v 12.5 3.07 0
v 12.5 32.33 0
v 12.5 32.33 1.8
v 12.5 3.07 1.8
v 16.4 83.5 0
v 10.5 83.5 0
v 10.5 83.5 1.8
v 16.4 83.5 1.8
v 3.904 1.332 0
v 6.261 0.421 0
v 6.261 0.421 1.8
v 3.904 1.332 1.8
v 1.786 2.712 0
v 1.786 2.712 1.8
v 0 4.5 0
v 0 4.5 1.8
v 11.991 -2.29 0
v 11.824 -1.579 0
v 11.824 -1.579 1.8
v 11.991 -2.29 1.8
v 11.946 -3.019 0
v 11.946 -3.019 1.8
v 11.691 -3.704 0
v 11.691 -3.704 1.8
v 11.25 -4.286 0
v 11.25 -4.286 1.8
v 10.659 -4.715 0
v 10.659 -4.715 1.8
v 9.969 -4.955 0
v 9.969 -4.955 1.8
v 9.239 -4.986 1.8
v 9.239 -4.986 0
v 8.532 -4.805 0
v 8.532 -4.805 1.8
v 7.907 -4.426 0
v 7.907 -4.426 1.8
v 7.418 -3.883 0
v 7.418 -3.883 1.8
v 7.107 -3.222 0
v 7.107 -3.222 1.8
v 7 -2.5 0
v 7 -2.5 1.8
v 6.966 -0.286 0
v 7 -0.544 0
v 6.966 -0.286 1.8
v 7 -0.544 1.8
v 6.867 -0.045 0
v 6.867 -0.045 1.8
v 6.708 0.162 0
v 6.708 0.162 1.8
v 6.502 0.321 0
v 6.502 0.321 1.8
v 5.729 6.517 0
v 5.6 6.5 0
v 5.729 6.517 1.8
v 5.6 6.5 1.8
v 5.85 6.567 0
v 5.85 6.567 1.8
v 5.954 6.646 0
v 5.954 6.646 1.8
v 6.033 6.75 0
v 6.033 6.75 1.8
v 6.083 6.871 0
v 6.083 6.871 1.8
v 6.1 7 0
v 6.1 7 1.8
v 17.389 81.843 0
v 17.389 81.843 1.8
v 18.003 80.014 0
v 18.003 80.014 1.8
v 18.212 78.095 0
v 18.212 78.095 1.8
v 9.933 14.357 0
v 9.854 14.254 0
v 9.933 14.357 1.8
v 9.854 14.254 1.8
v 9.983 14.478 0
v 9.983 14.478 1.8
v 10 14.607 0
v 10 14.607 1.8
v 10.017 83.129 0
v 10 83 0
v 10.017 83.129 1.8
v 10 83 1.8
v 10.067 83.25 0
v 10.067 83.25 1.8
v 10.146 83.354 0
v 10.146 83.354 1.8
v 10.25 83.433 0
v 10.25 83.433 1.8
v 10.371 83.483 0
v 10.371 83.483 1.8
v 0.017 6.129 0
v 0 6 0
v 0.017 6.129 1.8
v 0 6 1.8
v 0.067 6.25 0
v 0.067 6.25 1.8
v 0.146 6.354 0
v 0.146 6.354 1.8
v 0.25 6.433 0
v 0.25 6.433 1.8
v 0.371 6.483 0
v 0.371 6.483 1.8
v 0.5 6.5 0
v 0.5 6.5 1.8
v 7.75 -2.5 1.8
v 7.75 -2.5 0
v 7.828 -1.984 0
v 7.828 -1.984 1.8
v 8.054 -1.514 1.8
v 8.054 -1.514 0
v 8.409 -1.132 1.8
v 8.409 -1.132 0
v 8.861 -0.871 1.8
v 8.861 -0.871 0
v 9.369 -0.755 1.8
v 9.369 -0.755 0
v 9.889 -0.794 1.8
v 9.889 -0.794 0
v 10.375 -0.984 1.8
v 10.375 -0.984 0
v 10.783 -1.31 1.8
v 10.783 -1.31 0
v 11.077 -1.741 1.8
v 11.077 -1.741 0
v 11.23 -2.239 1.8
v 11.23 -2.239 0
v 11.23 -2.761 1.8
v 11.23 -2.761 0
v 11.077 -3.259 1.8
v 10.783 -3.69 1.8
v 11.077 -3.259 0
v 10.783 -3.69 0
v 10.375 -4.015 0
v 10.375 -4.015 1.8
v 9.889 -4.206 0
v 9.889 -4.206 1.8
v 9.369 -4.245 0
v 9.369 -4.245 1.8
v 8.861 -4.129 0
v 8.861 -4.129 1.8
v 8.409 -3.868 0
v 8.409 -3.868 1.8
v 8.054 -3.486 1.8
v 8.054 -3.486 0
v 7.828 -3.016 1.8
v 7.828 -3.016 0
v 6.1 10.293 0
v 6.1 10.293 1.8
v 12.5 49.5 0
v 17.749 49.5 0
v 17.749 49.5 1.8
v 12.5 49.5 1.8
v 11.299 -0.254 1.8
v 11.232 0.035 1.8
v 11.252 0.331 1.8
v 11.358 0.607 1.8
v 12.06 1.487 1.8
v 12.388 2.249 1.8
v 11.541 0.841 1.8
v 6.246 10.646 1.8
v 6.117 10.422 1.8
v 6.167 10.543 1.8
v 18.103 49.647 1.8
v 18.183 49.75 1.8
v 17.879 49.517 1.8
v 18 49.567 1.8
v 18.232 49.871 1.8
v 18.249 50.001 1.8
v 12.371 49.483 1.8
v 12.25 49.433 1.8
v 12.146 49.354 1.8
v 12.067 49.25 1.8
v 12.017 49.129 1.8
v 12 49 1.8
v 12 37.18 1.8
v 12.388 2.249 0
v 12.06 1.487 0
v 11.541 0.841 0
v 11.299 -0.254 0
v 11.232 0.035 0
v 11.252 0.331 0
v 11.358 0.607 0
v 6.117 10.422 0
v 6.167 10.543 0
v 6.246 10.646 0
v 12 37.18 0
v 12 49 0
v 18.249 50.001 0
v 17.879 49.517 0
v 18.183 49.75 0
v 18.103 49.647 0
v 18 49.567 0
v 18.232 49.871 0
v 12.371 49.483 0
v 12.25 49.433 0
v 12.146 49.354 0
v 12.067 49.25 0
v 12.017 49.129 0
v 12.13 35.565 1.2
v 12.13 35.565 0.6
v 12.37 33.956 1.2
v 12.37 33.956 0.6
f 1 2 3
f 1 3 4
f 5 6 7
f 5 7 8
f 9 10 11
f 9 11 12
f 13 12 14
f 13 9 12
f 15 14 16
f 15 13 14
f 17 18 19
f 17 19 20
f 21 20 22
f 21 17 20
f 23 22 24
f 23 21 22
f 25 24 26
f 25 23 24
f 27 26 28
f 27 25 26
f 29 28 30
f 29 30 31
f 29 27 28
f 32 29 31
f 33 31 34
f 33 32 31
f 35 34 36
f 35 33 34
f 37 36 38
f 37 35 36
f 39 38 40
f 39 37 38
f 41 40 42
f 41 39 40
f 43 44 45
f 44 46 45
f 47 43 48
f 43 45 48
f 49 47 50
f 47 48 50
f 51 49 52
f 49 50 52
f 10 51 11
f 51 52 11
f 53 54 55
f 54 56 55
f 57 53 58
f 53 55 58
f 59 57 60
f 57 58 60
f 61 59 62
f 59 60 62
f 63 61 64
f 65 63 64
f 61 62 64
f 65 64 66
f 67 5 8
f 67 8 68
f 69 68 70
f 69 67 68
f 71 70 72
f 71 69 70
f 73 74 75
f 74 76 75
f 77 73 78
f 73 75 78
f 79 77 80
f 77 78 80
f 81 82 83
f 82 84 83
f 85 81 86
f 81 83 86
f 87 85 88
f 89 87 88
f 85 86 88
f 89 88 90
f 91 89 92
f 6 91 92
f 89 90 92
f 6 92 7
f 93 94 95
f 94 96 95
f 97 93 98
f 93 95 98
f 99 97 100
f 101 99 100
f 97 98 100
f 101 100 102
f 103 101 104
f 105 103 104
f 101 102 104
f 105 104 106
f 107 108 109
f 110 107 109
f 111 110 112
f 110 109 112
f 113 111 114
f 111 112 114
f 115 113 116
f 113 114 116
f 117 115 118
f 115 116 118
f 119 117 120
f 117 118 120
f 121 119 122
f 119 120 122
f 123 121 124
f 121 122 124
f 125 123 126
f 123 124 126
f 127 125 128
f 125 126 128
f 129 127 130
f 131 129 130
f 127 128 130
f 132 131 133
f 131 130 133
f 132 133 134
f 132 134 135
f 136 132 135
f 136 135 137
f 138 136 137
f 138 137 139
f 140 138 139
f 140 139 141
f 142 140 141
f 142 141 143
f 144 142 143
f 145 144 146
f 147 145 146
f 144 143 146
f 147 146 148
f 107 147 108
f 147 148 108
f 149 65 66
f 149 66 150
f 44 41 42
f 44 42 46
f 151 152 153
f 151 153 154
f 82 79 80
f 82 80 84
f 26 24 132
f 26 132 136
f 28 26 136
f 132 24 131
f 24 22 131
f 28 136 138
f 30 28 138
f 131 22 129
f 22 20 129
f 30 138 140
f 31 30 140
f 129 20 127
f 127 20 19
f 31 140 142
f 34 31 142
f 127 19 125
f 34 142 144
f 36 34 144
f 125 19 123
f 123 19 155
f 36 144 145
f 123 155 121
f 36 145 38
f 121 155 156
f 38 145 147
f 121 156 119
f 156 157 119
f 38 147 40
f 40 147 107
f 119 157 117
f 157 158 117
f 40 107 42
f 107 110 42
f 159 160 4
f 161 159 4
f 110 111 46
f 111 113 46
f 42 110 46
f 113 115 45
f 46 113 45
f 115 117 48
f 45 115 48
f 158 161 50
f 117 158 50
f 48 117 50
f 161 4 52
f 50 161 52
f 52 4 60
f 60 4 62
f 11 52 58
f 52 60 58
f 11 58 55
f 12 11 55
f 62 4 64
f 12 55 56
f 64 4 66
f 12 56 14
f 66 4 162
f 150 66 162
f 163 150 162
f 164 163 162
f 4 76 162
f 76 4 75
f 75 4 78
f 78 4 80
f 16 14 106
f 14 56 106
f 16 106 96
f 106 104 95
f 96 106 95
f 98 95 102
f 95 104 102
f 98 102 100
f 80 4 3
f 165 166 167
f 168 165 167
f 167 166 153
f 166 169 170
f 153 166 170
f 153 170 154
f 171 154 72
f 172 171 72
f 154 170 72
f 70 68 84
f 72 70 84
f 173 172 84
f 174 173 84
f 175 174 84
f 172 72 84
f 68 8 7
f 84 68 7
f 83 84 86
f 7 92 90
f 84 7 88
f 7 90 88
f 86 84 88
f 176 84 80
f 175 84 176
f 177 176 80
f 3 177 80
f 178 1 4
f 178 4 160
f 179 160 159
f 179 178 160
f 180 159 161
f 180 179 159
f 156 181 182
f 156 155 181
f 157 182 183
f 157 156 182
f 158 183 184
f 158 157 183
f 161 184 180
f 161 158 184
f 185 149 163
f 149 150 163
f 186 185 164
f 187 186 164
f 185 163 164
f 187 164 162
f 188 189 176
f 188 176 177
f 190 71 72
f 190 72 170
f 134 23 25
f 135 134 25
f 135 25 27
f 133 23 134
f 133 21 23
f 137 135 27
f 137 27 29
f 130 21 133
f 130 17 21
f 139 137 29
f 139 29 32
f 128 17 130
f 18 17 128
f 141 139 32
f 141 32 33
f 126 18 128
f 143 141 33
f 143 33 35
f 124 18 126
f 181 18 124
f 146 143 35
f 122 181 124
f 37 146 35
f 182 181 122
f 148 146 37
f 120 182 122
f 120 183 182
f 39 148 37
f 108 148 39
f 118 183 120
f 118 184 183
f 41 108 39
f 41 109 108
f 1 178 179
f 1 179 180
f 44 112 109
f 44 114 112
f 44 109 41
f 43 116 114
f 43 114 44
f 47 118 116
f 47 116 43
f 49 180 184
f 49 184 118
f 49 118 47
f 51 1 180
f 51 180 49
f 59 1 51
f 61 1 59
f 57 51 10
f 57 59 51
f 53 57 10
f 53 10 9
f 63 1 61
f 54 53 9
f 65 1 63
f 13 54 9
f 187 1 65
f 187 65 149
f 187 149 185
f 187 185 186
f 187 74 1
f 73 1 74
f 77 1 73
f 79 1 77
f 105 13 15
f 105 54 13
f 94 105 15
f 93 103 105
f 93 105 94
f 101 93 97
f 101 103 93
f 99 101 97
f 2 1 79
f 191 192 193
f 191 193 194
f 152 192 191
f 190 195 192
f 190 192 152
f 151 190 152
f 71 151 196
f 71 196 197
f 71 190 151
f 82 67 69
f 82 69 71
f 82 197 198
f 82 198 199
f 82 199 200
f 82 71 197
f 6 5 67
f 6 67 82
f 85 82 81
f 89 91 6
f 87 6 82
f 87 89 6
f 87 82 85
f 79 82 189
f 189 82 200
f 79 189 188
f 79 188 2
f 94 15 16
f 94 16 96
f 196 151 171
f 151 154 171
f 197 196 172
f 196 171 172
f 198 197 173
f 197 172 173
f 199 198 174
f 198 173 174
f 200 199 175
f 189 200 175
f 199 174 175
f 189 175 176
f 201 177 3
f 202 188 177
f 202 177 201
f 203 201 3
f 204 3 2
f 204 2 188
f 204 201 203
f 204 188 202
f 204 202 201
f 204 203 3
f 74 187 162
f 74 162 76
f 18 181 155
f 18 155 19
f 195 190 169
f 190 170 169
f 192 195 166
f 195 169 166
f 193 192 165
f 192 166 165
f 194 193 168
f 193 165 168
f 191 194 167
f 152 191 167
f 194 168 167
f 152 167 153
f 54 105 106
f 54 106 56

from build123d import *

# Parameters (mm, degrees)
BOSS_EXTRUDE1_DEPTH = 1.8
FILLET1_R           = 0.5
SKETCH5_R           = 2.5
SKETCH5_R_2         = 1.75
BOSS_EXTRUDE2_DEPTH = 1.8
FILLET2_R           = 1


with BuildPart() as part:
    # Sketch1 → Boss-Extrude1 (new body)
    with BuildSketch(Plane.XY):
        with BuildLine():
            Line((0, 4.5), (0, 6.5))
            Line((0, 6.5), (6.1, 6.5))
            Line((6.1, 6.5), (6.1, 10.5))
            Line((6.1, 10.5), (10, 14.4))
            Line((10, 14.4), (10, 83.5))
            Line((10, 83.5), (16.4, 83.5))
            ThreePointArc((16.4, 83.5), (17.745328581, 80.945017946), (18.212299295, 78.095495067))
            Line((18.212299295, 78.095495067), (18.25, 49.5))
            Line((18.25, 49.5), (12, 49.5))
            Line((12, 49.5), (12, 37.18))
            add(Edge.make_bspline(
                [(12, 37.18), (12, 35.554764974), (12.5, 33.972282338), (12.5, 32.33)],
                knots=[0, 0, 0, 0, 1, 1, 1, 1], degree=3))
            Line((12.5, 32.33), (12.5, 3.07))
            ThreePointArc((12.5, 3.07), (11.600817818, 0.899182182), (9.43, 0))
            ThreePointArc((9.43, 0), (4.205660329, 1.182650422), (0, 4.5))
        make_face()
    extrude(amount=BOSS_EXTRUDE1_DEPTH)

    # Fillet1
    fillet1_edges = [part.edges().sort_by_distance(p)[0] for p in [
        (0, 6.5, 0.9),
        (6.1, 6.5, 0.9),
        (6.1, 10.5, 0.9),
        (10, 14.4, 0.9),
        (10, 83.5, 0.9),
        (18.25, 49.5, 0.9),
        (12, 49.5, 0.9),
    ]]
    fillet(fillet1_edges, radius=FILLET1_R)

    # Sketch5 → Boss-Extrude2 (add)
    # profile 1 of 3: a face of its own
    with BuildSketch(Plane(origin=(0, 0, 0), x_dir=(-1, 0, 0), z_dir=(0, 0, -1))):
        with Locations((-9.5, -2.499832541)):
            Circle(SKETCH5_R)
        with Locations((-9.5, -2.499832541)):
            Circle(SKETCH5_R_2, mode=Mode.SUBTRACT)
    # profile 2 of 3: a face of its own
    with BuildSketch(Plane(origin=(0, 0, 0), x_dir=(-1, 0, 0), z_dir=(0, 0, -1))):
        with BuildLine():
            ThreePointArc((-11.824045318, -1.578521867), (-9.031018815, -0.044215175), (-7, -2.499832541))
            Line((-7, -2.499832541), (-7, 0.245881701))
            ThreePointArc((-7, 0.245881701), (-8.2087959, 0.061626967), (-9.43, 0))
            ThreePointArc((-9.43, 0), (-10.256451345, 0.113333266), (-11.021883517, 0.444965358))
            Line((-11.021883517, 0.444965358), (-11.824045318, -1.578521867))
        make_face()
    # profile 3 of 3: a face of its own
    with BuildSketch(Plane(origin=(0, 0, 0), x_dir=(-1, 0, 0), z_dir=(0, 0, -1))):
        with BuildLine():
            ThreePointArc((-9.43, 0), (-8.2087959, 0.061626967), (-7, 0.245881701))
            Line((-7, 0.245881701), (-7, 0.500167459))
            Line((-7, 0.500167459), (-11, 0.500167459))
            Line((-11, 0.500167459), (-11.021883517, 0.444965358))
            ThreePointArc((-11.021883517, 0.444965358), (-10.256451345, 0.113333266), (-9.43, 0))
        make_face()
    extrude(amount=-BOSS_EXTRUDE2_DEPTH)

    # Fillet2
    fillet2_edges = [part.edges().sort_by_distance(p)[0] for p in [
        (7, 0.245881701, 0.9),
        (11.021883517, 0.444965358, 0.9),
    ]]
    fillet(fillet2_edges, radius=FILLET2_R)


solid = part.part
